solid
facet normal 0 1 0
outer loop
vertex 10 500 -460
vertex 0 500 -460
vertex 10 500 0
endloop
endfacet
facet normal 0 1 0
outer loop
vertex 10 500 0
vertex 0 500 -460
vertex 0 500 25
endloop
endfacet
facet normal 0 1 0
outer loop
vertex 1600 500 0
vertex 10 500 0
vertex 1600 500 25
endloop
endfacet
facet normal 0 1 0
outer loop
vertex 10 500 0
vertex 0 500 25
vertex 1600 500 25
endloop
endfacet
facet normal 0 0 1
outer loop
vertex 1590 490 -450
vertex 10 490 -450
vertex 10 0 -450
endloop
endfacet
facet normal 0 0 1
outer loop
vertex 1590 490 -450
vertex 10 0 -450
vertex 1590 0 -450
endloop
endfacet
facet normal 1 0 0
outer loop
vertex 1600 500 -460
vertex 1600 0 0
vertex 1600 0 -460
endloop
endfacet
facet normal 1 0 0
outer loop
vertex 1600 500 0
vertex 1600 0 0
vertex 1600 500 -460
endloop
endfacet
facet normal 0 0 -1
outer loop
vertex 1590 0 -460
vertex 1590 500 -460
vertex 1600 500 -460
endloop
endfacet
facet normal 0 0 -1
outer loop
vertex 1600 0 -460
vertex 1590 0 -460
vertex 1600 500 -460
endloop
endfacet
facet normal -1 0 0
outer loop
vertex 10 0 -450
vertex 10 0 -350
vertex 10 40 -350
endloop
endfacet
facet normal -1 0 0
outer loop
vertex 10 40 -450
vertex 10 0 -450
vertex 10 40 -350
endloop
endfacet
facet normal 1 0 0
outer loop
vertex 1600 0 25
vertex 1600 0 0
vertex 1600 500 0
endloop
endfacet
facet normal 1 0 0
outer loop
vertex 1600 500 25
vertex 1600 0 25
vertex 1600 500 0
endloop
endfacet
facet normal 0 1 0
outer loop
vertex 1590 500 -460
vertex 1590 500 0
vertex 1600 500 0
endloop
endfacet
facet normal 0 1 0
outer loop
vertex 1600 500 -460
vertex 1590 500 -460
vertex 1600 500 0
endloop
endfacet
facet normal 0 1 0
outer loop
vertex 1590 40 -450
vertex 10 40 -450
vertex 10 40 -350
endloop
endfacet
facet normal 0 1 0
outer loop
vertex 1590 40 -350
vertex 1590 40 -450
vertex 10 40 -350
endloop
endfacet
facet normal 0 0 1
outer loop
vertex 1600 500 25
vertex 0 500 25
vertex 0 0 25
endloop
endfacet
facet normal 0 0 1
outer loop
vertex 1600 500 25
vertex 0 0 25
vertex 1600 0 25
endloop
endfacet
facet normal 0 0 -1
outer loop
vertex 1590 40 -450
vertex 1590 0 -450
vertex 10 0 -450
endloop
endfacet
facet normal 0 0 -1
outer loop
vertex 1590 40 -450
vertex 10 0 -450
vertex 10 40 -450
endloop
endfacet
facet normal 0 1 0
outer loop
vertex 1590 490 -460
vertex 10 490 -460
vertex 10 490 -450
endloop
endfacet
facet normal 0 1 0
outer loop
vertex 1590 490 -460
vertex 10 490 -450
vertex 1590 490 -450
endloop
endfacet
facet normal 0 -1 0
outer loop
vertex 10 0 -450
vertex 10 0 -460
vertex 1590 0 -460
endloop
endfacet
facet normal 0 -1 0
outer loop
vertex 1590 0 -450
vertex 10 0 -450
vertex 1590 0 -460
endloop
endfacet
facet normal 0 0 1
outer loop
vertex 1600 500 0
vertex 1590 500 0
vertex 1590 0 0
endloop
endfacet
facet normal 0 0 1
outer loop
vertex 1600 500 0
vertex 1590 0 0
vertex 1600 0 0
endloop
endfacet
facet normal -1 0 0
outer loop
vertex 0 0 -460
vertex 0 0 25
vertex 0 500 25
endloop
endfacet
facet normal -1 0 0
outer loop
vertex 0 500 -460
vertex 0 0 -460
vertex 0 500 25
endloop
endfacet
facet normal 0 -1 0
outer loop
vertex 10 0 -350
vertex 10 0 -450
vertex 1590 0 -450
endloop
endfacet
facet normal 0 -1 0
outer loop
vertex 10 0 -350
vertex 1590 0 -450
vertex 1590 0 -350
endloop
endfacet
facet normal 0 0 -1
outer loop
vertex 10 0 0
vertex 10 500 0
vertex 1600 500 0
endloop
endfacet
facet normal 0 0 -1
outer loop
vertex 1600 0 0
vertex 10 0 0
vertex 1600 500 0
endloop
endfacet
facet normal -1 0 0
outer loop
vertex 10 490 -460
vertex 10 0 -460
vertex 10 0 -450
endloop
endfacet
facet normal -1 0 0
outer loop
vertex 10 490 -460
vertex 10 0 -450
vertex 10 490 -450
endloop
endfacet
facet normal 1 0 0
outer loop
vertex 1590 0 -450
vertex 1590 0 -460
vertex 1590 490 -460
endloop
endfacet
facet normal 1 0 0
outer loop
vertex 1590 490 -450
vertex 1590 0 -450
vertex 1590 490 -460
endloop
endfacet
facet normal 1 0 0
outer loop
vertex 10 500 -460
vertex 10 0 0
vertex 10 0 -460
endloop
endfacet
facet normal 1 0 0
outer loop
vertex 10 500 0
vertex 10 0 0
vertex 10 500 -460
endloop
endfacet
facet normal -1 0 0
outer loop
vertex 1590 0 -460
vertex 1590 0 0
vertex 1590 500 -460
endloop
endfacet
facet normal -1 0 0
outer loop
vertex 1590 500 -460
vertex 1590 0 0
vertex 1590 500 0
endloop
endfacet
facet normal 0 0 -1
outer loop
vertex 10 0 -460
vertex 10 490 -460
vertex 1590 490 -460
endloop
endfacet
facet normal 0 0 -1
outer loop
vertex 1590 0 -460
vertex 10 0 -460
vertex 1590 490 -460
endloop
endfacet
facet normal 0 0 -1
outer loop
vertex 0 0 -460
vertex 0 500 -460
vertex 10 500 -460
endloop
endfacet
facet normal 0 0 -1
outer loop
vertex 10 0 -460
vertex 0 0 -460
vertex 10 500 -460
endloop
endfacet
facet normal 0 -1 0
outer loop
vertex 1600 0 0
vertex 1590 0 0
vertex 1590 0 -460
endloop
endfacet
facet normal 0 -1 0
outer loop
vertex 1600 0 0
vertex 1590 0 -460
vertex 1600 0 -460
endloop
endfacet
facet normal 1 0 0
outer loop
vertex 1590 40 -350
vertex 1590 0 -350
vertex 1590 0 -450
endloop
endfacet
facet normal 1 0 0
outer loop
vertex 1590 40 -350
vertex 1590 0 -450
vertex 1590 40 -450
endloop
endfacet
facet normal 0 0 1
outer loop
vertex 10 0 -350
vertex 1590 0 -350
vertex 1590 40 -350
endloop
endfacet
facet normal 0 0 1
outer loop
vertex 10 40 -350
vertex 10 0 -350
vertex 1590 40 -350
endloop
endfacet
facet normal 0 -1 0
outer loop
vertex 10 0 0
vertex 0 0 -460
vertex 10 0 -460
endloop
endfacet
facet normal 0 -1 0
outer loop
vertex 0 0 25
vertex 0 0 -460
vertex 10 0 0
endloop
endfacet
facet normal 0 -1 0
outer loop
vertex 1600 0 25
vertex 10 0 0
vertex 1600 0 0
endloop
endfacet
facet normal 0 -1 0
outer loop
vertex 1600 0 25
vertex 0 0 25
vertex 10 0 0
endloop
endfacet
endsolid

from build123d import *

# Parameters (mm, degrees)
F0_W      = 1600
F0_H      = 500
F1_DEPTH  = 25
F3_W      = 1580
F3_H      = 490
F4_DEPTH  = 10
F5_W      = 10
F5_H      = 500
F6_DEPTH  = 460
F7_W      = 10
F7_H      = 500
F8_DEPTH  = 460
F9_W      = 40
F9_H      = 100
F10_DEPTH = 1580


with BuildPart() as f1:
    # F0 (on Top) → F1 (new body)
    with BuildSketch(Plane.XY):
        with Locations((800, 250)):
            Rectangle(F0_W, F0_H)
    extrude(amount=F1_DEPTH)

    # F5 (on face) → F6 (join, through all)
    with BuildSketch(Plane.XY):
        with Locations((5, 250)):
            Rectangle(F5_W, F5_H)
    extrude(amount=-F6_DEPTH)


with BuildPart() as f4:
    # F3 (on offset) → F4 (new body)
    with BuildSketch(Plane.XY.offset(-460)):
        with Locations((800, 245)):
            Rectangle(F3_W, F3_H)
    extrude(amount=F4_DEPTH)


with BuildPart() as f8:
    # F7 (on face) → F8 (new body, through all)
    with BuildSketch(Plane.XY):
        with Locations((1595, 250)):
            Rectangle(F7_W, F7_H)
    extrude(amount=-F8_DEPTH)


with BuildPart() as f10:
    # F9 (on face) → F10 (new body, through all)
    with BuildSketch(Plane.YZ.offset(10)):
        with Locations((20, -400)):
            Rectangle(F9_W, F9_H)
    extrude(amount=F10_DEPTH)


solid = Compound([f1.part, f4.part, f8.part, f10.part])
